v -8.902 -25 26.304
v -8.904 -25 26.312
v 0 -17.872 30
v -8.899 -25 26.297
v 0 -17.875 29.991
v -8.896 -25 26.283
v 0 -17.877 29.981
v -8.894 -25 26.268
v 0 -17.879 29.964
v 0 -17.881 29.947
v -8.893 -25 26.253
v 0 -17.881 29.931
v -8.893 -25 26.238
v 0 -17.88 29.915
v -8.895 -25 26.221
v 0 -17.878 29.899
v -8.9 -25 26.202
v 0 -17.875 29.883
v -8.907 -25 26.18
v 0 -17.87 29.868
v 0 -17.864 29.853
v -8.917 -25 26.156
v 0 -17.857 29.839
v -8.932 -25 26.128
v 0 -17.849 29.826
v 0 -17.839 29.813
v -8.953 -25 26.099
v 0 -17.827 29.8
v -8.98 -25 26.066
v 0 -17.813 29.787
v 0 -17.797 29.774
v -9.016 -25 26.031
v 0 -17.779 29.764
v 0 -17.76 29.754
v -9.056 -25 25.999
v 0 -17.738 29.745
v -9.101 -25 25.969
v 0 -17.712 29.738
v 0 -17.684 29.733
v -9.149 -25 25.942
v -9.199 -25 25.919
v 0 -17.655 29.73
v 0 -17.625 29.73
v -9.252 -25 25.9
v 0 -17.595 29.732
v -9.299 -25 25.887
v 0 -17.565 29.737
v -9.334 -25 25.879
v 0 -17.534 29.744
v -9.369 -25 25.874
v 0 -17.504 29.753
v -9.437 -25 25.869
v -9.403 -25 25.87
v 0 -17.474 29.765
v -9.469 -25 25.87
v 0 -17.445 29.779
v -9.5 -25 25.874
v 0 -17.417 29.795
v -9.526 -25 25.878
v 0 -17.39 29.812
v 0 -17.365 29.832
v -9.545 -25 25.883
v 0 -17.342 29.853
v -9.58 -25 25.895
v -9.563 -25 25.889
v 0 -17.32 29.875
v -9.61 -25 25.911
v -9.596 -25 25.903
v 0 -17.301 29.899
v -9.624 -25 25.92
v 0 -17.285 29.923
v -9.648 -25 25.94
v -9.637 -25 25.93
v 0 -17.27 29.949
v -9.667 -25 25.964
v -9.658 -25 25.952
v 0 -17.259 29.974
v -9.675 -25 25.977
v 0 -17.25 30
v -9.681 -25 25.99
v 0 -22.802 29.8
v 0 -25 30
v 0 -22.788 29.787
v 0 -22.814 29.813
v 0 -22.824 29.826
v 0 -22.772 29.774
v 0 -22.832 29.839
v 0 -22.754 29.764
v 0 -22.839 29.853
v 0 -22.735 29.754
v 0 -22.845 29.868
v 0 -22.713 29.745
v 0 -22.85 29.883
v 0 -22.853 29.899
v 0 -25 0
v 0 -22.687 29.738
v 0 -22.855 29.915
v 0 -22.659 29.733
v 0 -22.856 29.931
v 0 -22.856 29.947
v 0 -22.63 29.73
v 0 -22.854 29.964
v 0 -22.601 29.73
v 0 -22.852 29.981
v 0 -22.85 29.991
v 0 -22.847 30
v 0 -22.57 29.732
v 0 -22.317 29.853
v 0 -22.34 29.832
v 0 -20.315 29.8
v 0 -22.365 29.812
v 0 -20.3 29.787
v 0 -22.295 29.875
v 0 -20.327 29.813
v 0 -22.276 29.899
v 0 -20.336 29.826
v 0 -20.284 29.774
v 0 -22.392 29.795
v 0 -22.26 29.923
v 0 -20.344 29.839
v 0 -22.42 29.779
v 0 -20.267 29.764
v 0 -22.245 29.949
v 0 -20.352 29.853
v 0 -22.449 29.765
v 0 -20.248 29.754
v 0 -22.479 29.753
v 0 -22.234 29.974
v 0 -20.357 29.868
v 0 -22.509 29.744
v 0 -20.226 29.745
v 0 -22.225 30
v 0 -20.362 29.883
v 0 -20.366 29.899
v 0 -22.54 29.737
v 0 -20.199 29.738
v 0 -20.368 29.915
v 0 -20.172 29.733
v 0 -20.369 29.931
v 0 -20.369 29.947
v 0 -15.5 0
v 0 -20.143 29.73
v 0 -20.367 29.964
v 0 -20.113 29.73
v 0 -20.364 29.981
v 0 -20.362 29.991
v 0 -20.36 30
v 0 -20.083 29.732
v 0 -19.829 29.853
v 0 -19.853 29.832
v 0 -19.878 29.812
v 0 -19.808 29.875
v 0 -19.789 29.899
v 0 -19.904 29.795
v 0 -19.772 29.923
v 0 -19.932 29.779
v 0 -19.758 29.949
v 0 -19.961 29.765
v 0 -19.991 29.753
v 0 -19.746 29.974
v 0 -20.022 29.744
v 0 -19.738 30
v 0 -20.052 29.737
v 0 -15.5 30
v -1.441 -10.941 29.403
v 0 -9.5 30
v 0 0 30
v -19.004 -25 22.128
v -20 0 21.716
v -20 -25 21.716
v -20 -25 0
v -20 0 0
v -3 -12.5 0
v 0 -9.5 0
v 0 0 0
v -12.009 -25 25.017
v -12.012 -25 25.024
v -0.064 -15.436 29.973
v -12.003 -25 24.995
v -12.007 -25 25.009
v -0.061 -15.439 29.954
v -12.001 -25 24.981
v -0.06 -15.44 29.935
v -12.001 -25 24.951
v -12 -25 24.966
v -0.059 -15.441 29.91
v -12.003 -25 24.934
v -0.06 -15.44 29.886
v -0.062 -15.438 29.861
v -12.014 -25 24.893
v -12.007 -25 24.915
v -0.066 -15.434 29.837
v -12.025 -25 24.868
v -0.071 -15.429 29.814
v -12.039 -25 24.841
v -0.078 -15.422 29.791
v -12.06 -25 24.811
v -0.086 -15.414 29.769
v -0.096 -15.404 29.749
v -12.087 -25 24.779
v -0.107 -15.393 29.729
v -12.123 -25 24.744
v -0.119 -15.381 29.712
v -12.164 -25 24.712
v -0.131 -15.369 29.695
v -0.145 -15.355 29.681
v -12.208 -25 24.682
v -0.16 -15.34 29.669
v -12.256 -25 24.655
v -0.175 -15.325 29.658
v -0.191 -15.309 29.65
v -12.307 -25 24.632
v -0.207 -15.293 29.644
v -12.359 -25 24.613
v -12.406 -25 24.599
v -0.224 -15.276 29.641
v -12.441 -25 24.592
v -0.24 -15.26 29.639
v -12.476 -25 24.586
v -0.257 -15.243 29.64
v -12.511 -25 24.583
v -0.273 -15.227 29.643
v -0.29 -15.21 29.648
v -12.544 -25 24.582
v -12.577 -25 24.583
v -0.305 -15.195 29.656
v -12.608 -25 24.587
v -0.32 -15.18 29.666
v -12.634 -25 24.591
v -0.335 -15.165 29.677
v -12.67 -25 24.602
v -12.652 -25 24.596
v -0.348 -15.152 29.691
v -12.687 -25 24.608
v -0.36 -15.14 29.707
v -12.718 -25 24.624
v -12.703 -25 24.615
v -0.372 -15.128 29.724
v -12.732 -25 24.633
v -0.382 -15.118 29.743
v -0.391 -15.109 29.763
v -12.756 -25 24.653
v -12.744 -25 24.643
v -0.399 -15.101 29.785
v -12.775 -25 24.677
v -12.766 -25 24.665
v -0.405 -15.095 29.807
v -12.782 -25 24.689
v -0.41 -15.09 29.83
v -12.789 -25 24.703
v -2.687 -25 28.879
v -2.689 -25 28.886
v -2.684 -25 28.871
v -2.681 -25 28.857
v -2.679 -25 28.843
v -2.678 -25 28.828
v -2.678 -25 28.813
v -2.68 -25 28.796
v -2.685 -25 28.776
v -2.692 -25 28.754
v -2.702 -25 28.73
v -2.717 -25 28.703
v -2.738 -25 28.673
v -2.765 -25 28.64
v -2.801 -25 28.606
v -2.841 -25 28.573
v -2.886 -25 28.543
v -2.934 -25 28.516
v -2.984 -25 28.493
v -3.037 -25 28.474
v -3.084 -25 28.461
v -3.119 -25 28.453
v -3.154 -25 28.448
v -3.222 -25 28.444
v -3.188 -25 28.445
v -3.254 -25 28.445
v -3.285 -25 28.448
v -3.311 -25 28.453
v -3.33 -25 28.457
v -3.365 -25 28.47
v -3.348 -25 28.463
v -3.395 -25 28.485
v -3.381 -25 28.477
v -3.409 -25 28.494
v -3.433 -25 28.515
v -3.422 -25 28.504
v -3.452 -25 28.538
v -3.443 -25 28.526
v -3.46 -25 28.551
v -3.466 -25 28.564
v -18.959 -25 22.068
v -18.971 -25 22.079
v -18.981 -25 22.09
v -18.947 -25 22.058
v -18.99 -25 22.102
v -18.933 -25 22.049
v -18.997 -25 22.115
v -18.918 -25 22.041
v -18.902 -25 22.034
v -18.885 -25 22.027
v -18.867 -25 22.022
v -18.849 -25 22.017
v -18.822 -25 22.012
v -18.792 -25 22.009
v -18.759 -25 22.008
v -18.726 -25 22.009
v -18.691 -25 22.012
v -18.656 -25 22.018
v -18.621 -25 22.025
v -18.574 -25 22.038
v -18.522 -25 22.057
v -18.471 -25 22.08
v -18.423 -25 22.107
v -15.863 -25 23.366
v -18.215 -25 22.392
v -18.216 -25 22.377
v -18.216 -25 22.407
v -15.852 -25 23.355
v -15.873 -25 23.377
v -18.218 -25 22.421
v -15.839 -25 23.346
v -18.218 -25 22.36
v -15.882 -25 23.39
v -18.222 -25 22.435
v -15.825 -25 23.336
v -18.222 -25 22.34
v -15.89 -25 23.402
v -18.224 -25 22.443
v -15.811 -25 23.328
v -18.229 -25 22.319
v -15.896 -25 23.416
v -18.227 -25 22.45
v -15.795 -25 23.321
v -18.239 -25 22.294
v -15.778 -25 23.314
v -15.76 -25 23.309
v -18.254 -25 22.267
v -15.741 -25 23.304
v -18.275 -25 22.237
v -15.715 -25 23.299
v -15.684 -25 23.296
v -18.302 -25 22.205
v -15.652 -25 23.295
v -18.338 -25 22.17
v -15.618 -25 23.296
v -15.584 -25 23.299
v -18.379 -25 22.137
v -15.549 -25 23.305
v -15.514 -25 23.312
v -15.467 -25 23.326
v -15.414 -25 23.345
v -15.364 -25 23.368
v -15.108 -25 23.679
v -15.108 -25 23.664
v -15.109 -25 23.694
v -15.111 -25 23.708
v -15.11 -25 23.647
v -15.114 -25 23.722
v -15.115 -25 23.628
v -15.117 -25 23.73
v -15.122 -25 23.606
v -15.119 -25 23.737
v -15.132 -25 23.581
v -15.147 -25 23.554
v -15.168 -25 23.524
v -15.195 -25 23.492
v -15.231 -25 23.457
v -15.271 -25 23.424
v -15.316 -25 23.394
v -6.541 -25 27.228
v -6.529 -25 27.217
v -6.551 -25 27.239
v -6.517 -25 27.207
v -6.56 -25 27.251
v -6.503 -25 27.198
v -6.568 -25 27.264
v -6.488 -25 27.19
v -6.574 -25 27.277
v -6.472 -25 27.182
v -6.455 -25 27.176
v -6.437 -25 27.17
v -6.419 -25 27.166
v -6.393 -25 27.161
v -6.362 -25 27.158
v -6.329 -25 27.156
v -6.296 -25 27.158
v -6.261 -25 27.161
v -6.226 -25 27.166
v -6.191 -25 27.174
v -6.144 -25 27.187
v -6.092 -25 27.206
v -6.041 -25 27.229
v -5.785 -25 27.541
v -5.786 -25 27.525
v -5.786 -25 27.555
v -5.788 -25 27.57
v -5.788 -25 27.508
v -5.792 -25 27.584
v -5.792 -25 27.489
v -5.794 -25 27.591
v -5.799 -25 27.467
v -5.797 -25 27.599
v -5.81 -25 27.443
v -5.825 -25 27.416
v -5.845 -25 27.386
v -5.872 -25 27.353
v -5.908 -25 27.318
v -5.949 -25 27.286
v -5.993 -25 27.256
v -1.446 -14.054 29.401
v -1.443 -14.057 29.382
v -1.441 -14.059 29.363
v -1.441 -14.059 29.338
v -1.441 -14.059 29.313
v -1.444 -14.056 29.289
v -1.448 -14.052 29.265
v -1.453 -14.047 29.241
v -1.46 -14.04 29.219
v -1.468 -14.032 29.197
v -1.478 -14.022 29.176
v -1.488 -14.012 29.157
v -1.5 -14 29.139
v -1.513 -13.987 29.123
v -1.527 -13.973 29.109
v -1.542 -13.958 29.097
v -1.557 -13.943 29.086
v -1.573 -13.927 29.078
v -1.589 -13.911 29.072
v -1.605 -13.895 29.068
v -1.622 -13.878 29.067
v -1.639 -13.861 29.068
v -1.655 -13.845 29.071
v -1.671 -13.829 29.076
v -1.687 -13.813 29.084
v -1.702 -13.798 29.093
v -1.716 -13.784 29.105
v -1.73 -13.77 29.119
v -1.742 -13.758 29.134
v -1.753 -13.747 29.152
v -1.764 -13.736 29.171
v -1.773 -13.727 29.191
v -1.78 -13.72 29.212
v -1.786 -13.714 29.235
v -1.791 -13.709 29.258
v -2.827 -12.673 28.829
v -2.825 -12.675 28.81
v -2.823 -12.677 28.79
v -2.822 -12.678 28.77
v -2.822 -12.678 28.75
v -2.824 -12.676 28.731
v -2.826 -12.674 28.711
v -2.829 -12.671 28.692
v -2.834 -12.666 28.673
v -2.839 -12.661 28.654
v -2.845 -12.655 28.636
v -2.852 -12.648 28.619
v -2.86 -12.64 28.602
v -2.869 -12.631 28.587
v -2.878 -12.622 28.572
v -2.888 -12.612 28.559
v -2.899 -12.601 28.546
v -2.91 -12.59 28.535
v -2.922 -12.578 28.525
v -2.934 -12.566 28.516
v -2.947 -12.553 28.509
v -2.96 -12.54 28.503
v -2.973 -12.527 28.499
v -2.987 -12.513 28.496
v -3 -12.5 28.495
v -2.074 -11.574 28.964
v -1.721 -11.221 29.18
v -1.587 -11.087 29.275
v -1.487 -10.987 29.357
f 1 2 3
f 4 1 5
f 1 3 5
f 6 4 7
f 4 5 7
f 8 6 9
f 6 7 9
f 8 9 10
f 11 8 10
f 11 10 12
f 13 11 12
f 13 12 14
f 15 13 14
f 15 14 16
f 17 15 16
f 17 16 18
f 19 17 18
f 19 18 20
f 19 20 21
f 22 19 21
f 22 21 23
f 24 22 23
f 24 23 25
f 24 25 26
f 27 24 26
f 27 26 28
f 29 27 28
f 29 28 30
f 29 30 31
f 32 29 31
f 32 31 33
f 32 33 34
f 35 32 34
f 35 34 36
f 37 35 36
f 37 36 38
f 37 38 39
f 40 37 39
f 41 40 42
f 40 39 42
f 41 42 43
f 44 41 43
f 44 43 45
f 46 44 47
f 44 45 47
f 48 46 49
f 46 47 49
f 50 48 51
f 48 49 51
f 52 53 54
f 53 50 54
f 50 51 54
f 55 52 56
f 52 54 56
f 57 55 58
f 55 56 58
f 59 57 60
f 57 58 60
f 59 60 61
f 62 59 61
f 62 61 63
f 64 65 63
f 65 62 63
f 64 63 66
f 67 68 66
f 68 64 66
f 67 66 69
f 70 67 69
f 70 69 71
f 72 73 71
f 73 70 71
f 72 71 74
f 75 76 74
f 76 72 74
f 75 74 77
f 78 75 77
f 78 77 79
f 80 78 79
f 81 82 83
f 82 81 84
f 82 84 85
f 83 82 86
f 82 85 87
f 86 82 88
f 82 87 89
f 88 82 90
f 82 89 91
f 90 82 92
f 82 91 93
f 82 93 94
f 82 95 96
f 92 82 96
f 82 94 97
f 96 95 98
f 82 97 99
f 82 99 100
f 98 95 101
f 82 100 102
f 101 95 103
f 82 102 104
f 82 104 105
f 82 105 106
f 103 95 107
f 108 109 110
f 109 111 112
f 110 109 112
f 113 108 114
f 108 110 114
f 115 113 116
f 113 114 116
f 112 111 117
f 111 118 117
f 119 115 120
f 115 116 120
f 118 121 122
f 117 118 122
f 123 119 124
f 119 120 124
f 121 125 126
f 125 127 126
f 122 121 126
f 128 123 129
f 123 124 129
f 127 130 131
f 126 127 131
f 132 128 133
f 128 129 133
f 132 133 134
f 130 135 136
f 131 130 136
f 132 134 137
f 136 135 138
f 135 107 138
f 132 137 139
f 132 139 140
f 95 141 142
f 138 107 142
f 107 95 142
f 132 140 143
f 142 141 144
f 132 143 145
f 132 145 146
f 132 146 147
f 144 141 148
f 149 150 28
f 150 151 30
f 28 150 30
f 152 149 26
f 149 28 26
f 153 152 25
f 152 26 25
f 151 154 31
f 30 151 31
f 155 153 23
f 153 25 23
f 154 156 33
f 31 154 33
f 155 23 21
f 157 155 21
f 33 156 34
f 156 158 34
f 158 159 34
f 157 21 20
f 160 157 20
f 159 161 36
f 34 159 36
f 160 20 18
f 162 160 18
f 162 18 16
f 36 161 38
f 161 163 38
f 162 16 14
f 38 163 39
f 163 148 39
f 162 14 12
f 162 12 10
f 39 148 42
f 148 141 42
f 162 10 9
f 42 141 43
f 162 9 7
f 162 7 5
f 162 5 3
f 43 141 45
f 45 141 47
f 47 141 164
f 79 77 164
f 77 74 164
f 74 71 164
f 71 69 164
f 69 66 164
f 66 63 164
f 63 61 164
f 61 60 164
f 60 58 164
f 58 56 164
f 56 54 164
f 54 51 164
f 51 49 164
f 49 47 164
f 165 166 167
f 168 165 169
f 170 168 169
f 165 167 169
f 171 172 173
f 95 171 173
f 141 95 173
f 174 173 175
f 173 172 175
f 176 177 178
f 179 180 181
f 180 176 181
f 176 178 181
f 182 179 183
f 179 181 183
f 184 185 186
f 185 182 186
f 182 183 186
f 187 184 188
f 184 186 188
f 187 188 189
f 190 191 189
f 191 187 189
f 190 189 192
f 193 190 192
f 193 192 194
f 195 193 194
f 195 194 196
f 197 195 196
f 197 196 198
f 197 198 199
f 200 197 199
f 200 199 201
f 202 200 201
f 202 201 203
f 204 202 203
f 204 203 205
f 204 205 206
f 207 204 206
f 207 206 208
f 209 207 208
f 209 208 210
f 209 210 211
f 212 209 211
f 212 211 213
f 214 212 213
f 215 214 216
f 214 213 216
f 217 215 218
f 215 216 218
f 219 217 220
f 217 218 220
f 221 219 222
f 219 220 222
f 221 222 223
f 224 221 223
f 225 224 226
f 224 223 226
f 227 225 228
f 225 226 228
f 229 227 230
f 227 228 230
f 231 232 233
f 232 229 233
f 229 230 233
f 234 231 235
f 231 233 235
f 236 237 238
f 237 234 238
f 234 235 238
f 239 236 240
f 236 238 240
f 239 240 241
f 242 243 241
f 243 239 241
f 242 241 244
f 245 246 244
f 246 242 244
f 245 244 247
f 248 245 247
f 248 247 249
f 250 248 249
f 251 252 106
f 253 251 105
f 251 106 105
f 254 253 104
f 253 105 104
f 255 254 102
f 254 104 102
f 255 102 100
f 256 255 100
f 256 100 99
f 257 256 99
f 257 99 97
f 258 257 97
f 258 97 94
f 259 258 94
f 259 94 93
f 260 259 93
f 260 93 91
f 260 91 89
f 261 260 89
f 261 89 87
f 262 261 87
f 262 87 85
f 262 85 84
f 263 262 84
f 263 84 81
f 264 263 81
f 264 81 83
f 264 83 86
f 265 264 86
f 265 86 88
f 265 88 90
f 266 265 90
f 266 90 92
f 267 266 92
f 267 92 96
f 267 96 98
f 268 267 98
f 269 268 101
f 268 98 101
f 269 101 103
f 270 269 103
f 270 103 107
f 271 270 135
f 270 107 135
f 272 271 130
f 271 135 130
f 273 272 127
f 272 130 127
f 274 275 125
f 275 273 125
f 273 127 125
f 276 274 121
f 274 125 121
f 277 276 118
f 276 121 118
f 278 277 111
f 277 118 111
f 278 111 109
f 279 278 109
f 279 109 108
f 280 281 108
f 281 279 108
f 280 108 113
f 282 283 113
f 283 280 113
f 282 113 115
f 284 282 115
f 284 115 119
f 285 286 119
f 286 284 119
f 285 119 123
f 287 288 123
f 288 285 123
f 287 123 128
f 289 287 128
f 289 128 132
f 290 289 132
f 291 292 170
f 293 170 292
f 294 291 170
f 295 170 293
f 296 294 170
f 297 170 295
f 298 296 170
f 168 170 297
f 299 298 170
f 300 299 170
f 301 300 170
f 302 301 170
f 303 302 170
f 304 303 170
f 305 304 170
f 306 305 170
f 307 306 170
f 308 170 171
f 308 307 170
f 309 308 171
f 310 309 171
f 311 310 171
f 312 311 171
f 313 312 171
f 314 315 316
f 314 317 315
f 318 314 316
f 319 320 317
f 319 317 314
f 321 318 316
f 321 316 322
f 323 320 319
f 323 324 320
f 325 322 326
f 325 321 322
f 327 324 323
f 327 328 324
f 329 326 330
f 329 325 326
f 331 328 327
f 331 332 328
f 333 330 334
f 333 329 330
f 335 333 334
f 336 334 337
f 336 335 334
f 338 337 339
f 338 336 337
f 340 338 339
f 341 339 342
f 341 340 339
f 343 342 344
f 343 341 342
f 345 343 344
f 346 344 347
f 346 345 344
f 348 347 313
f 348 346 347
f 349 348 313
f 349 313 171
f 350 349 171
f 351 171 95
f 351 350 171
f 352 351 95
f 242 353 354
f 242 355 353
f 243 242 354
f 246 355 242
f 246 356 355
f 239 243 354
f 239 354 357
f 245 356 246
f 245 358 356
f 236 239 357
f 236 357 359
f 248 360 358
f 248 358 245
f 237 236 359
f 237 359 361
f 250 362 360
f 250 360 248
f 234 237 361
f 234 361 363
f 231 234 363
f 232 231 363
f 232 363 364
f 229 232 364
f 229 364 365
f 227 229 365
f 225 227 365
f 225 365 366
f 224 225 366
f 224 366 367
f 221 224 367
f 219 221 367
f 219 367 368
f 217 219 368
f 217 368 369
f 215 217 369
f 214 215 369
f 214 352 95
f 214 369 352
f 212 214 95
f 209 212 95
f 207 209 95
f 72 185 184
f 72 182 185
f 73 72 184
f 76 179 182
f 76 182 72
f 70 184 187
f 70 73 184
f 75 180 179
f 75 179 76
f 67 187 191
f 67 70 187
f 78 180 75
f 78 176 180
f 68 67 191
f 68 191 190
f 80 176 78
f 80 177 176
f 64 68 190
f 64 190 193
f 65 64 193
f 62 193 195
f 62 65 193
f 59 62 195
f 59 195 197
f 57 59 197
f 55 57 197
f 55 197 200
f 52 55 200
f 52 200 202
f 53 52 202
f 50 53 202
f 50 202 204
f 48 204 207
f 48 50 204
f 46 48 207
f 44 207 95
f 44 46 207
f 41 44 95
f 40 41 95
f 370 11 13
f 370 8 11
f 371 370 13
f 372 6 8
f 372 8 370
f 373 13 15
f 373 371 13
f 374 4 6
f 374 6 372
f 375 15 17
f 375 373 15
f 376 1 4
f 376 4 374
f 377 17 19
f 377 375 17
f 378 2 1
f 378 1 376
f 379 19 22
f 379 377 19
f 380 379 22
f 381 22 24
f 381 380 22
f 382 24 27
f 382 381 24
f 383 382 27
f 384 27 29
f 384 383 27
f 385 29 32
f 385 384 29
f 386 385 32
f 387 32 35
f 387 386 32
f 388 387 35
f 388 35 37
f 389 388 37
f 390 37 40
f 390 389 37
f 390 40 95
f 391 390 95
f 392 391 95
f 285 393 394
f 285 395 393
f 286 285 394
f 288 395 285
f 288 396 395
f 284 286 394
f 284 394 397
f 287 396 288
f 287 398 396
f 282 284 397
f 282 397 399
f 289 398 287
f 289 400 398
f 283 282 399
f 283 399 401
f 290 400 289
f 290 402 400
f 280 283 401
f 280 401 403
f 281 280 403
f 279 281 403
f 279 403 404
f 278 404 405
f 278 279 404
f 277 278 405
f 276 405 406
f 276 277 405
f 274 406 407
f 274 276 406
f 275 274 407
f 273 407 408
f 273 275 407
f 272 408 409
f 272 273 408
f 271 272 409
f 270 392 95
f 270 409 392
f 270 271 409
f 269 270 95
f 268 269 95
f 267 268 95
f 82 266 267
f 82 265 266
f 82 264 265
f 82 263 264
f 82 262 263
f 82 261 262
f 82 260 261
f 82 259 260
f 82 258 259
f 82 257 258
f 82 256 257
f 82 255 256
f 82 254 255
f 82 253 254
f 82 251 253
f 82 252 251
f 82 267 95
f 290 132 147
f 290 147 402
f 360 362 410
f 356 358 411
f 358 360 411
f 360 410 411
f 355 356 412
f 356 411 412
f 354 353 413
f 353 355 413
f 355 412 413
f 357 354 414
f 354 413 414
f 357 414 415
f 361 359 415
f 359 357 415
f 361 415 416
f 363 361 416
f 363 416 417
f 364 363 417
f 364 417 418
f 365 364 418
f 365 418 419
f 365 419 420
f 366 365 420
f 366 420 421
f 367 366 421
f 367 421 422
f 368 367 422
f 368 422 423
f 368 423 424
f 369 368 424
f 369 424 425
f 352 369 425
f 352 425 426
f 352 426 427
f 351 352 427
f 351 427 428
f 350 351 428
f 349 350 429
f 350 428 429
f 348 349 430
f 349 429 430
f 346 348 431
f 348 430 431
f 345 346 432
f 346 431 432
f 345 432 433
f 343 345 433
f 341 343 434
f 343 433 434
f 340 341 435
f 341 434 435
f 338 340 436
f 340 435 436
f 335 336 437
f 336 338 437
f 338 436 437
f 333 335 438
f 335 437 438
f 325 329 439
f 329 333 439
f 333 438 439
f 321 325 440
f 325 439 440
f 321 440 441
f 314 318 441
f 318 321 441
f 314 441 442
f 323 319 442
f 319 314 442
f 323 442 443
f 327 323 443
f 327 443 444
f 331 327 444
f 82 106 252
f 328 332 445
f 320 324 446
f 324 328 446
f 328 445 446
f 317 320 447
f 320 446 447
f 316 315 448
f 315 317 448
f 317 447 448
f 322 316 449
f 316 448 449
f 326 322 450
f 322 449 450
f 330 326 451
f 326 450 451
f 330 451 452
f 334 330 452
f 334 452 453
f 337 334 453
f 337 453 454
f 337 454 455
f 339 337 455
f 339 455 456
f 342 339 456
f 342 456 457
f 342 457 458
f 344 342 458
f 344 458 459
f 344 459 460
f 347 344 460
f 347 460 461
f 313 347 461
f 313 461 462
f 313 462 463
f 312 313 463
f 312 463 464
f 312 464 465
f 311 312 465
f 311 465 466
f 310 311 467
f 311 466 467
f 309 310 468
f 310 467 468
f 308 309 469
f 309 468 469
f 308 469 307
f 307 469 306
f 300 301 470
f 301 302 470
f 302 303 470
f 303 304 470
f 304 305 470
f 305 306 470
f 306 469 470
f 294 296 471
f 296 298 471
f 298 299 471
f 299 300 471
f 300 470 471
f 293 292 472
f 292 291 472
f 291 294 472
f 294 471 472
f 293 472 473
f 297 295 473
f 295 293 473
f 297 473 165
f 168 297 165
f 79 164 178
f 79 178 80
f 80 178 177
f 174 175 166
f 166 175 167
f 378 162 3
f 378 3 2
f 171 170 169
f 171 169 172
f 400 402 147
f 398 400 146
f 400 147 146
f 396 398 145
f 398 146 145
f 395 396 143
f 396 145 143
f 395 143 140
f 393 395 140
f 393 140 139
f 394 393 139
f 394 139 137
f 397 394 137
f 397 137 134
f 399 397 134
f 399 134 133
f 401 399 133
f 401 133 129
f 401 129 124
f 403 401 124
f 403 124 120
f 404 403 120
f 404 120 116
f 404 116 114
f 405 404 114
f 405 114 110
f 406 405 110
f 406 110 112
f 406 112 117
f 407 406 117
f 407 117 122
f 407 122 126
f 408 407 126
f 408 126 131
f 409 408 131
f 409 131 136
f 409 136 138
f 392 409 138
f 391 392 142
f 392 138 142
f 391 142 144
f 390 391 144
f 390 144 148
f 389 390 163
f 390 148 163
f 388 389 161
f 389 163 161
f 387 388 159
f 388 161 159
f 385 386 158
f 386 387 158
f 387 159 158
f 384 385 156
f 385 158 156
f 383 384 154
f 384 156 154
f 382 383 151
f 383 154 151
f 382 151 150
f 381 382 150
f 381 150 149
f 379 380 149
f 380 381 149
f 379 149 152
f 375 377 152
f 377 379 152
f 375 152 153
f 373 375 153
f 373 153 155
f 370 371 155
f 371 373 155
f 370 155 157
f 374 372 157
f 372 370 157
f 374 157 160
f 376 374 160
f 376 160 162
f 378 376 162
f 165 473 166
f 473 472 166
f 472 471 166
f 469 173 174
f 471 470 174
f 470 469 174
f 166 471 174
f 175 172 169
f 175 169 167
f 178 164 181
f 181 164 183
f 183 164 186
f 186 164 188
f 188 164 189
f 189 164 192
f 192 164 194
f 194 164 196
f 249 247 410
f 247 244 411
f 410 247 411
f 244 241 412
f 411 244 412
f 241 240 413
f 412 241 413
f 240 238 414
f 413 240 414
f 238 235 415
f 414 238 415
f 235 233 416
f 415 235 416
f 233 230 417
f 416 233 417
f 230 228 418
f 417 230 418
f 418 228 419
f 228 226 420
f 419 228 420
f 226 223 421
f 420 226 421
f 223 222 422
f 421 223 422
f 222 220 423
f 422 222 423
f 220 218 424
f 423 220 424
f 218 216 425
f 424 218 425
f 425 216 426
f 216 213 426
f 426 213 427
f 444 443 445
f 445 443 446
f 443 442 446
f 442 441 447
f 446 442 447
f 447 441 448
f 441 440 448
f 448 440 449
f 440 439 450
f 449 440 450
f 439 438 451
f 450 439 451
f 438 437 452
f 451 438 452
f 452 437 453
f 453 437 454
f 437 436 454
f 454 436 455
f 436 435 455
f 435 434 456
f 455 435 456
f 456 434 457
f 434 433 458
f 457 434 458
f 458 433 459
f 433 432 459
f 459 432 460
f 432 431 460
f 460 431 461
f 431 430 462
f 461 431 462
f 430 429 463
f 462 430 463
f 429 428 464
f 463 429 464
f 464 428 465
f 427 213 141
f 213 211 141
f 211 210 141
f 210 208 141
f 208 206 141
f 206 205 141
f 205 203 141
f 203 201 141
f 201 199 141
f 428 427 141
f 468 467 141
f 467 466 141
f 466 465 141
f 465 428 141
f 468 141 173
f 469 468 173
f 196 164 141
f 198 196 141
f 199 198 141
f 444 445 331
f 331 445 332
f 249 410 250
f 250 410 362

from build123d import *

# Parameters (mm, degrees)
F1_DEPTH = 25
F3_DEPTH = 30.001
F6_R     = 0.25
F7_DEPTH = 38.9529986152


with BuildPart() as f1:
    # F0 (on Front) → F1 (new body)
    with BuildSketch(Plane.XZ):
        Polygon((-20, 0), (0, 0), (0, 30), (-20, 21.7157287525), align=None)
    extrude(amount=F1_DEPTH)

    # F2 (on face) → F3 (cut, through all)
    with BuildSketch(Plane(origin=(0, 0, 0), x_dir=(1, 0, 0), z_dir=(0, 0, -1))):
        Polygon((0, 9.5), (0, 15.5), (-3, 12.5), align=None)
    extrude(amount=-F3_DEPTH, mode=Mode.SUBTRACT)

    # F6 (on line) → F7 (cut, through all)
    with BuildSketch(Plane(origin=(6.8564591979, 5.4885609135, 2.8400383896), x_dir=(-0.5493524956, 0.8040106793, -0.2275492542), z_dir=(0.7428090106, 0.5946148564, 0.3076815664))):
        with Locations((-14.9457916694, 27.7163859753)):
            Circle(F6_R)
        with Locations((-16.9457916694, 27.7163859753)):
            Circle(F6_R)
        with Locations((-18.9457916694, 27.7163859753)):
            Circle(F6_R)
        with Locations((-20.9457916694, 27.7163859753)):
            Circle(F6_R)
        with Locations((-22.9457916694, 27.7163859753)):
            Circle(F6_R)
        with Locations((-24.9457916694, 27.7163859753)):
            Circle(F6_R)
    extrude(amount=-F7_DEPTH, mode=Mode.SUBTRACT)


solid = f1.part
